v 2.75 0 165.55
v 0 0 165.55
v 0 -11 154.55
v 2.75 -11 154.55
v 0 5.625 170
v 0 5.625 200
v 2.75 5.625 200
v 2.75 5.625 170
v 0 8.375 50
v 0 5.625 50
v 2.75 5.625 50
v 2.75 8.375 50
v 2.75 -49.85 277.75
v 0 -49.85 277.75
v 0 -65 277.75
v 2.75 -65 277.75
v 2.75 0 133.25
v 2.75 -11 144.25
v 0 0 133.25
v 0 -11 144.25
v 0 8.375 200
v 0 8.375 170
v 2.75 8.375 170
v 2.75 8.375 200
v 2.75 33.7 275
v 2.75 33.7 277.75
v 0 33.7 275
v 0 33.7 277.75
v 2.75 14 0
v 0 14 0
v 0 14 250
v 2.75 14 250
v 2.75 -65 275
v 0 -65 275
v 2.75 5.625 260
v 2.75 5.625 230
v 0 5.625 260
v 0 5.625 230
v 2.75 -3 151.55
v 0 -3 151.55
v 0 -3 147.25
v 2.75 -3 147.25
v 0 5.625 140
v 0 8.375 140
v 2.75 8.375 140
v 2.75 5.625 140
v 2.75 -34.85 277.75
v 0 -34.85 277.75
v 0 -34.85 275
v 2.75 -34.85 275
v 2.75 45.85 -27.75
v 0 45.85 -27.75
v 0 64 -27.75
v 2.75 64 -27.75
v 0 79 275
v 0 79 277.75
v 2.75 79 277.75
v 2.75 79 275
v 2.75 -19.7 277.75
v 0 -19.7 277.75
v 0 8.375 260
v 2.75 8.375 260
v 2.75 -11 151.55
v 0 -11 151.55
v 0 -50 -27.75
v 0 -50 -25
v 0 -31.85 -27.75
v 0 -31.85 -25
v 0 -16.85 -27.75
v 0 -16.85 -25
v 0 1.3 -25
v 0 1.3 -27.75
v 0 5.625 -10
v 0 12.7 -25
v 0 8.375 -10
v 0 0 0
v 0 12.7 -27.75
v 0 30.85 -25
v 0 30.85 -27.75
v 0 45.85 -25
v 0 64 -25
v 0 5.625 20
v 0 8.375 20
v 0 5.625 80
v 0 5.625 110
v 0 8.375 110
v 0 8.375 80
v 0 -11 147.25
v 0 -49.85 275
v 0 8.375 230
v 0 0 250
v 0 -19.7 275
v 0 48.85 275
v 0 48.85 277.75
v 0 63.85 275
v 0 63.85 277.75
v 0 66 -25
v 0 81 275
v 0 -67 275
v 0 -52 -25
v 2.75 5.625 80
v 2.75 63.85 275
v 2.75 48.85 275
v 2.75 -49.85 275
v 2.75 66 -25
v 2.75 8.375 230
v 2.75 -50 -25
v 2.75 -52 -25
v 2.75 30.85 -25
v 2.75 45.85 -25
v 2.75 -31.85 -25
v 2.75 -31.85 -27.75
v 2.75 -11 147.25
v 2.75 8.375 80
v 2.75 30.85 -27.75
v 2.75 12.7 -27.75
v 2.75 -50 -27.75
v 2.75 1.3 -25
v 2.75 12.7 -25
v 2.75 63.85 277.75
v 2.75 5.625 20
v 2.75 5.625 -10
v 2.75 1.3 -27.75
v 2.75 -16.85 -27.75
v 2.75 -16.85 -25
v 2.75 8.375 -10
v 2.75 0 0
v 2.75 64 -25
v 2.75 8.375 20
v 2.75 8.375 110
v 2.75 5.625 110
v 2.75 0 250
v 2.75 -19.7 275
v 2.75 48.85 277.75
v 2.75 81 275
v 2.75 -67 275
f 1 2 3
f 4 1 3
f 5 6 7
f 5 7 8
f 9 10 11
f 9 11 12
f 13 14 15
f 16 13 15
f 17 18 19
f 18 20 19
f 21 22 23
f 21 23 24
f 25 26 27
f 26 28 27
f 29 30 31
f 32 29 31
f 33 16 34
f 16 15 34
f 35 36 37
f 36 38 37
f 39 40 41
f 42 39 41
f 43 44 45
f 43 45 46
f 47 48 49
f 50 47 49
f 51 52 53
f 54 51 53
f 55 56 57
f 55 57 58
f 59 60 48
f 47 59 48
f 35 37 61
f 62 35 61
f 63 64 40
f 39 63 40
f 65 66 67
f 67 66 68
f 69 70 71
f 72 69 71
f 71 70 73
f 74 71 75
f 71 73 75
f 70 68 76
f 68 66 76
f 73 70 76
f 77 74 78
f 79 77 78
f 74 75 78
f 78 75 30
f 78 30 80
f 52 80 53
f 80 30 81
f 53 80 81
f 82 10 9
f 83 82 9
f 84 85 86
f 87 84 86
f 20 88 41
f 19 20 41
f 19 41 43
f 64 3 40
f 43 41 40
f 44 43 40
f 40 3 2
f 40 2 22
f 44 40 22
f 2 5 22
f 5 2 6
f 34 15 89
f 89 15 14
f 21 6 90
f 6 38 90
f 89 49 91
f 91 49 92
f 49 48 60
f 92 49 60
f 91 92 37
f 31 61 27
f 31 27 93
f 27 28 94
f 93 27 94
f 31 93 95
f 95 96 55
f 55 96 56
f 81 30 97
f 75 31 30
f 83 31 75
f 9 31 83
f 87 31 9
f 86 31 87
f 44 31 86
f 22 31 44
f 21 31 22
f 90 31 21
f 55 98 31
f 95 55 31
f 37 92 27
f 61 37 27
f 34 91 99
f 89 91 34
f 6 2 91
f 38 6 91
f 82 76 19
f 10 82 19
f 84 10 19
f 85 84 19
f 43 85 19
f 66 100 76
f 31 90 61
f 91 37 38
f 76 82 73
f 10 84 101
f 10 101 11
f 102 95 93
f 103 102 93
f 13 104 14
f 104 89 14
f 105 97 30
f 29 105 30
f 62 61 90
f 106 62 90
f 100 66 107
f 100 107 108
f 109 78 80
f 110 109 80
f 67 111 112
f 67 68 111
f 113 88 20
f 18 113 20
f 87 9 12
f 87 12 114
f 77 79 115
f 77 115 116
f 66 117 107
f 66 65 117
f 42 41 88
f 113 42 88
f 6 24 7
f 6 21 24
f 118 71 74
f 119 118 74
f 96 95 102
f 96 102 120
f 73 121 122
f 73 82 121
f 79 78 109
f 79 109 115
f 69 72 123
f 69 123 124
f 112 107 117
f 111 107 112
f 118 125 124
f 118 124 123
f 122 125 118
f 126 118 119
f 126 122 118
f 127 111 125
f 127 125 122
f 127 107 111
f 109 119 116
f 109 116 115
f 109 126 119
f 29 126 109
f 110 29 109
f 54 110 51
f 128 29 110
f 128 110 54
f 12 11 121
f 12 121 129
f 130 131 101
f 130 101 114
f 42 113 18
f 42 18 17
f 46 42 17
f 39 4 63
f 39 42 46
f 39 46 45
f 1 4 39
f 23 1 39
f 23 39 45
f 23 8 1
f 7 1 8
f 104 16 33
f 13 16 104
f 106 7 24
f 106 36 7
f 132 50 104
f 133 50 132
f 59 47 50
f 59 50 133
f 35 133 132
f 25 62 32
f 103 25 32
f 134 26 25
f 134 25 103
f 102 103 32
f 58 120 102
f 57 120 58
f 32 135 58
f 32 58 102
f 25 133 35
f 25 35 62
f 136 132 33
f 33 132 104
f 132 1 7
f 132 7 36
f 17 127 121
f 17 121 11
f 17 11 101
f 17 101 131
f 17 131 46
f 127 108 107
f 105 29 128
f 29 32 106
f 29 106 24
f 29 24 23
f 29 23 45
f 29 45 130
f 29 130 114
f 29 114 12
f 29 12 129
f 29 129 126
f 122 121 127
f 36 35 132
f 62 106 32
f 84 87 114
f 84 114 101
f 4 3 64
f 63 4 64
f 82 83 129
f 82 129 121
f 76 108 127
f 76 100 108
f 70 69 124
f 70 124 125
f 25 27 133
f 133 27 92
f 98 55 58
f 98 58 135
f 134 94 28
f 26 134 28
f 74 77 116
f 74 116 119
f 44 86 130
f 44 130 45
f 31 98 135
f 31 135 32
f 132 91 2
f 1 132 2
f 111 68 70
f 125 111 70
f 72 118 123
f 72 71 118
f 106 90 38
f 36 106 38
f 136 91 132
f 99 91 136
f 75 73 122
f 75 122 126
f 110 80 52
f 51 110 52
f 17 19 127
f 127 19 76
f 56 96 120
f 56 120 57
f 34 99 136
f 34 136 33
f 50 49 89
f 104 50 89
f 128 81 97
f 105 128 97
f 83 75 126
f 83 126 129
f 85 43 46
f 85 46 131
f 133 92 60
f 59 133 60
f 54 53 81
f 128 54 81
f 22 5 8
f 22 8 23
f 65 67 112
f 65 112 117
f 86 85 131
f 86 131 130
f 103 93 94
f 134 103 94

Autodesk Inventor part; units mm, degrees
ref_plane "YZ Plane" through (0, 0, 0) normal (1, 0, 0) x (0, 1, 0)
ref_plane "XZ Plane" through (0, 0, 0) normal (0, 1, 0) x (-1, 0, 0)
ref_plane "XY Plane" through (0, 0, 0) normal (0, 0, 1) x (1, 0, 0)
sketch "Sketch1" plane through (0, 0, 0) normal (1, 0, 0) x (0, 1, 0)
  line L0 (0, 0) -> (14, 0) construction
  line L1 (14, 0) -> (14, 250)
  line L2 (14, 250) -> (0, 250) construction
  line L3 (0, 250) -> (0, 0)
  line L4 (-50, -25) -> (64, -25)
  line L5 (79, 275) -> (-65, 275)
  line L6 (8.375, 200) -> (5.625, 200)
  line L7 (5.625, 200) -> (5.625, 170)
  line L8 (5.625, 170) -> (8.375, 170)
  line L9 (8.375, 170) -> (8.375, 200)
  line L10 (8.375, 140) -> (5.625, 140)
  line L11 (5.625, 140) -> (5.625, 110)
  line L12 (5.625, 110) -> (8.375, 110)
  line L13 (8.375, 110) -> (8.375, 140)
  line L14 (8.375, 80) -> (5.625, 80)
  line L15 (5.625, 80) -> (5.625, 50)
  line L16 (5.625, 50) -> (8.375, 50)
  line L17 (8.375, 50) -> (8.375, 80)
  line L18 (8.375, 20) -> (5.625, 20)
  line L19 (5.625, 20) -> (5.625, -10)
  line L20 (5.625, -10) -> (8.375, -10)
  line L21 (8.375, -10) -> (8.375, 20)
  line L22 (8.375, 230) -> (5.625, 230)
  line L23 (5.625, 230) -> (5.625, 260)
  line L24 (5.625, 260) -> (8.375, 260)
  line L25 (8.375, 260) -> (8.375, 230)
  line L26 (-65, 275) -> (-49.85, 275)
  line L27 (-49.85, 275) -> (-49.85, 277.75)
  line L28 (-49.85, 277.75) -> (-65, 277.75)
  line L29 (-65, 277.75) -> (-65, 275)
  line L30 (79, 275) -> (63.85, 275)
  line L31 (63.85, 275) -> (63.85, 277.75)
  line L32 (63.85, 277.75) -> (79, 277.75)
  line L33 (79, 277.75) -> (79, 275)
  line L34 (-34.85, 275) -> (-19.7, 275)
  line L35 (-19.7, 275) -> (-19.7, 277.75)
  line L36 (-19.7, 277.75) -> (-34.85, 277.75)
  line L37 (-34.85, 277.75) -> (-34.85, 275)
  line L38 (33.7, 275) -> (48.85, 275)
  line L39 (48.85, 275) -> (48.85, 277.75)
  line L40 (48.85, 277.75) -> (33.7, 277.75)
  line L41 (33.7, 277.75) -> (33.7, 275)
  line L42 (-50, -25) -> (-31.85, -25)
  line L43 (-31.85, -25) -> (-31.85, -27.75)
  line L44 (-31.85, -27.75) -> (-50, -27.75)
  line L45 (-50, -27.75) -> (-50, -25)
  line L46 (-16.85, -25) -> (1.3, -25)
  line L47 (1.3, -25) -> (1.3, -27.75)
  line L48 (1.3, -27.75) -> (-16.85, -27.75)
  line L49 (-16.85, -27.75) -> (-16.85, -25)
  line L50 (12.7, -25) -> (30.85, -25)
  line L51 (30.85, -25) -> (30.85, -27.75)
  line L52 (30.85, -27.75) -> (12.7, -27.75)
  line L53 (12.7, -27.75) -> (12.7, -25)
  line L54 (64, -25) -> (45.85, -25)
  line L55 (45.85, -25) -> (45.85, -27.75)
  line L56 (45.85, -27.75) -> (64, -27.75)
  line L57 (64, -27.75) -> (64, -25)
  line L58 (0, 250) -> (-67, 275)
  line L59 (-67, 275) -> (-65, 275)
  line L60 (79, 275) -> (81, 275)
  line L61 (81, 275) -> (14, 250)
  line L62 (-50, -25) -> (-52, -25)
  line L63 (-52, -25) -> (0, 0)
  line L64 (64, -25) -> (66, -25)
  line L65 (66, -25) -> (14, 0)
  point P0 (7, 170)
  dimension "d3" = 30
  dimension "d4" = 60
  dimension "d5" = 60
  dimension "d6" = 60
  dimension "d7" = 7
  dimension "d8" = 7
  dimension "d9" = 2.75
  dimension "d10" = 15
  dimension "d11" = 50
  dimension "d12" = 50
  dimension "d13" = 25
  dimension "d14" = 25
  dimension "d15" = 65
  dimension "d16" = 300
  dimension "d17" = 65
  dimension "d18" = 60
  dimension "d19" = 2.75
  dimension "d21" = 15.15
  dimension "d22" = 15
  dimension "d24" = 15
  dimension "d27" = 2.75
  dimension "d28" = 18.15
  dimension "d29" = 15
  dimension "d30" = 15
  dimension "d31" = 11.4
  dimension "d32" = 30.15
  dimension "d34" = 68.55
  dimension "d35" = 30.15
  dimension "d44" = 2
  dimension "d45" = 2
  dimension "d46" = 2
  dimension "d47" = 2
extrude "Extrusion1" add sketch "Sketch1" along normal blind 2.75
sketch "Sketch2" plane through (0, 0, 0) normal (-1, 0, 0) x (0, 0, 1)
  line L0 (250, 0) -> (0, 0) projected
  line L1 (165.55, 0) -> (154.55, -11)
  line L2 (154.55, -11) -> (151.55, -11)
  line L3 (151.55, -11) -> (151.55, -3)
  line L4 (151.55, -3) -> (147.25, -3)
  line L5 (147.25, -3) -> (147.25, -11)
  line L6 (147.25, -11) -> (144.25, -11)
  line L7 (144.25, -11) -> (133.25, 0)
  line L8 (-27.75, -50) -> (-27.75, -31.85) projected
  dimension "d36" = 8
  dimension "d38" = 4.3
  dimension "d39" = 11
  dimension "d40" = 45
  dimension "d41" = 3
  dimension "d48" = 175
extrude "Extrusion2" add sketch "Sketch2" against normal up to surface (2.75 mm away)
equation "\"d5\" = d4"
equation "\"d6\" = d4"
equation "\"d18\" = d4"
equation "\"d30\" = d29"
properties part number "TrayPanelF"
